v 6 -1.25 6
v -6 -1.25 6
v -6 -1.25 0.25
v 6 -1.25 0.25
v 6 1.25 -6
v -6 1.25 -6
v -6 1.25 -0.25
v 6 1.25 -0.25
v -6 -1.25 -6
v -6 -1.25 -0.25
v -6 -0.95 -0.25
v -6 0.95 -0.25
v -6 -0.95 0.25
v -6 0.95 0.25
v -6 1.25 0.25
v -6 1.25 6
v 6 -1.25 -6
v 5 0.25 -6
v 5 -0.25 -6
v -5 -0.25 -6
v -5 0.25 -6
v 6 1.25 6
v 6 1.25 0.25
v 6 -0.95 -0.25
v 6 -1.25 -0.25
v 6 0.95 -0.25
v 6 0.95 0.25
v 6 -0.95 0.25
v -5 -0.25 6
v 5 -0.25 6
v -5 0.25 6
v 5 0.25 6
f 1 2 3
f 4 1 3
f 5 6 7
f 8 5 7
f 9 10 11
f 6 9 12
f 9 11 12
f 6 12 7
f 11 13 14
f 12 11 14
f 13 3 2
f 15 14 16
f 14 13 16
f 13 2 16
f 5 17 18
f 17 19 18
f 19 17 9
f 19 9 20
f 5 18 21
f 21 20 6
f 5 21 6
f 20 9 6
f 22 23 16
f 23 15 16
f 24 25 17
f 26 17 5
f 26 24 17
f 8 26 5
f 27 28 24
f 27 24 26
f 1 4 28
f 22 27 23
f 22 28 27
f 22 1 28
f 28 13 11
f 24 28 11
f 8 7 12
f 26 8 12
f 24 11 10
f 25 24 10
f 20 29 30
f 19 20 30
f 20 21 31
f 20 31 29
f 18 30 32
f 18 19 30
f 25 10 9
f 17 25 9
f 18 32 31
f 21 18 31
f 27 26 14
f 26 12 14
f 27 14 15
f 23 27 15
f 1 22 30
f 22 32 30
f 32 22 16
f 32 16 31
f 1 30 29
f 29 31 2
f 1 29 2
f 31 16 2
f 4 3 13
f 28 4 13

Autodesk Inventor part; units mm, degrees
ref_plane "YZ Plane" through (0, 0, 0) normal (1, 0, 0) x (0, 1, 0)
ref_plane "XZ Plane" through (0, 0, 0) normal (0, 1, 0) x (-1, 0, 0)
ref_plane "XY Plane" through (0, 0, 0) normal (0, 0, 1) x (1, 0, 0)
sketch "Skizze2" plane through (0, 0, 0) normal (1, 0, 0) x (0, 1, 0)
  line L0 (1.25, 6) -> (-1.25, 6)
  line L1 (-1.25, 6) -> (-1.25, 0.25)
  line L2 (-1.25, 0.25) -> (-0.95, 0.25)
  line L3 (-0.95, 0.25) -> (-0.95, -0.25)
  line L4 (-0.95, -0.25) -> (-1.25, -0.25)
  line L5 (-1.25, -0.25) -> (-1.25, -6)
  line L6 (-1.25, -6) -> (1.25, -6)
  line L7 (1.25, -6) -> (1.25, -0.25)
  line L8 (1.25, -0.25) -> (0.95, -0.25)
  line L9 (0.95, -0.25) -> (0.95, 0.25)
  line L10 (0.95, 0.25) -> (1.25, 0.25)
  line L11 (1.25, 0.25) -> (1.25, 6)
  line L12 (0.25, 6) -> (0.25, -6) construction
  line L13 (-0.25, -6) -> (-0.25, 6) construction
  point P0 (0, 0)
  point P1 (0.95, 0)
  dimension "d0" = 0.5
  dimension "d1" = 1
  dimension "d2" = 1
  dimension "d3" = 0.5
  dimension "d4" = 0.25
  dimension "d5" = 0.3
  dimension "d6" = 0.3
  dimension "d7" = 6
  dimension "d8" = 6
extrude "Extrusion1" add sketch "Skizze2" along normal mid plane 12
sketch "Skizze3" plane through (-6, -1.25, -6) normal (0, 0, -1) x (-1, 0, 0)
  line L0 (-11, 1.5) -> (-1, 1.5)
  line L1 (-1, 1.5) -> (-1, 1)
  line L2 (-1, 1) -> (-11, 1)
  line L3 (-11, 1) -> (-11, 1.5)
  line L4 (0, 2.5) -> (-12, 2.5) projected
  line L5 (0, 2.5) -> (0, 0) projected
  point P0 (-6, 1.25)
  point P1 (-6, 1.5)
  point P2 (-6, 2.5)
  point P3 (-1, 1.25)
  point P4 (0, 1.25)
  dimension "d11" = 10
  dimension "d12" = 0.5
extrude "Extrusion2" cut sketch "Skizze3" against normal blind 12
sketch "Skizze4" plane through (-5, -0.25, -6) normal (0, 1, 0) x (1, 0, 0)
  line L0 (-1, -12) -> (11, -12) projected
  line L1 (-1, 0) -> (11, 0) projected
  line L2 (4.3, 0) -> (5.7, 0)
  line L3 (5.7, 0) -> (5.7, -12)
  line L4 (5.7, -12) -> (4.3, -12)
  line L5 (4.3, -12) -> (4.3, 0)
  line L6 (3.3, -12) -> (1.9, -12)
  line L7 (1.9, -12) -> (1.9, 0)
  line L8 (1.9, 0) -> (3.3, 0)
  line L9 (3.3, 0) -> (3.3, -12)
  line L10 (6.7, 0) -> (8.1, 0)
  line L11 (8.1, 0) -> (8.1, -12)
  line L12 (8.1, -12) -> (6.7, -12)
  line L13 (6.7, -12) -> (6.7, 0)
  point P0 (5, -6)
  point P1 (5, -12)
  point P2 (5, -12)
  dimension "d15" = 1.4
  dimension "d16" = 1
  dimension "d17" = 1
split_face "Trennen1"
split_face "Trennen2"
split_face "Trennen3"
equation "\"d2\" = d1"
equation "\"d4\" = 0.5 * d0"
equation "\"d6\" = d5"
equation "\"d8\" = d7"
equation "\"d17\" = d16"
properties part number "3_Pin_LED_Verbinder" material "PA 6.6"
